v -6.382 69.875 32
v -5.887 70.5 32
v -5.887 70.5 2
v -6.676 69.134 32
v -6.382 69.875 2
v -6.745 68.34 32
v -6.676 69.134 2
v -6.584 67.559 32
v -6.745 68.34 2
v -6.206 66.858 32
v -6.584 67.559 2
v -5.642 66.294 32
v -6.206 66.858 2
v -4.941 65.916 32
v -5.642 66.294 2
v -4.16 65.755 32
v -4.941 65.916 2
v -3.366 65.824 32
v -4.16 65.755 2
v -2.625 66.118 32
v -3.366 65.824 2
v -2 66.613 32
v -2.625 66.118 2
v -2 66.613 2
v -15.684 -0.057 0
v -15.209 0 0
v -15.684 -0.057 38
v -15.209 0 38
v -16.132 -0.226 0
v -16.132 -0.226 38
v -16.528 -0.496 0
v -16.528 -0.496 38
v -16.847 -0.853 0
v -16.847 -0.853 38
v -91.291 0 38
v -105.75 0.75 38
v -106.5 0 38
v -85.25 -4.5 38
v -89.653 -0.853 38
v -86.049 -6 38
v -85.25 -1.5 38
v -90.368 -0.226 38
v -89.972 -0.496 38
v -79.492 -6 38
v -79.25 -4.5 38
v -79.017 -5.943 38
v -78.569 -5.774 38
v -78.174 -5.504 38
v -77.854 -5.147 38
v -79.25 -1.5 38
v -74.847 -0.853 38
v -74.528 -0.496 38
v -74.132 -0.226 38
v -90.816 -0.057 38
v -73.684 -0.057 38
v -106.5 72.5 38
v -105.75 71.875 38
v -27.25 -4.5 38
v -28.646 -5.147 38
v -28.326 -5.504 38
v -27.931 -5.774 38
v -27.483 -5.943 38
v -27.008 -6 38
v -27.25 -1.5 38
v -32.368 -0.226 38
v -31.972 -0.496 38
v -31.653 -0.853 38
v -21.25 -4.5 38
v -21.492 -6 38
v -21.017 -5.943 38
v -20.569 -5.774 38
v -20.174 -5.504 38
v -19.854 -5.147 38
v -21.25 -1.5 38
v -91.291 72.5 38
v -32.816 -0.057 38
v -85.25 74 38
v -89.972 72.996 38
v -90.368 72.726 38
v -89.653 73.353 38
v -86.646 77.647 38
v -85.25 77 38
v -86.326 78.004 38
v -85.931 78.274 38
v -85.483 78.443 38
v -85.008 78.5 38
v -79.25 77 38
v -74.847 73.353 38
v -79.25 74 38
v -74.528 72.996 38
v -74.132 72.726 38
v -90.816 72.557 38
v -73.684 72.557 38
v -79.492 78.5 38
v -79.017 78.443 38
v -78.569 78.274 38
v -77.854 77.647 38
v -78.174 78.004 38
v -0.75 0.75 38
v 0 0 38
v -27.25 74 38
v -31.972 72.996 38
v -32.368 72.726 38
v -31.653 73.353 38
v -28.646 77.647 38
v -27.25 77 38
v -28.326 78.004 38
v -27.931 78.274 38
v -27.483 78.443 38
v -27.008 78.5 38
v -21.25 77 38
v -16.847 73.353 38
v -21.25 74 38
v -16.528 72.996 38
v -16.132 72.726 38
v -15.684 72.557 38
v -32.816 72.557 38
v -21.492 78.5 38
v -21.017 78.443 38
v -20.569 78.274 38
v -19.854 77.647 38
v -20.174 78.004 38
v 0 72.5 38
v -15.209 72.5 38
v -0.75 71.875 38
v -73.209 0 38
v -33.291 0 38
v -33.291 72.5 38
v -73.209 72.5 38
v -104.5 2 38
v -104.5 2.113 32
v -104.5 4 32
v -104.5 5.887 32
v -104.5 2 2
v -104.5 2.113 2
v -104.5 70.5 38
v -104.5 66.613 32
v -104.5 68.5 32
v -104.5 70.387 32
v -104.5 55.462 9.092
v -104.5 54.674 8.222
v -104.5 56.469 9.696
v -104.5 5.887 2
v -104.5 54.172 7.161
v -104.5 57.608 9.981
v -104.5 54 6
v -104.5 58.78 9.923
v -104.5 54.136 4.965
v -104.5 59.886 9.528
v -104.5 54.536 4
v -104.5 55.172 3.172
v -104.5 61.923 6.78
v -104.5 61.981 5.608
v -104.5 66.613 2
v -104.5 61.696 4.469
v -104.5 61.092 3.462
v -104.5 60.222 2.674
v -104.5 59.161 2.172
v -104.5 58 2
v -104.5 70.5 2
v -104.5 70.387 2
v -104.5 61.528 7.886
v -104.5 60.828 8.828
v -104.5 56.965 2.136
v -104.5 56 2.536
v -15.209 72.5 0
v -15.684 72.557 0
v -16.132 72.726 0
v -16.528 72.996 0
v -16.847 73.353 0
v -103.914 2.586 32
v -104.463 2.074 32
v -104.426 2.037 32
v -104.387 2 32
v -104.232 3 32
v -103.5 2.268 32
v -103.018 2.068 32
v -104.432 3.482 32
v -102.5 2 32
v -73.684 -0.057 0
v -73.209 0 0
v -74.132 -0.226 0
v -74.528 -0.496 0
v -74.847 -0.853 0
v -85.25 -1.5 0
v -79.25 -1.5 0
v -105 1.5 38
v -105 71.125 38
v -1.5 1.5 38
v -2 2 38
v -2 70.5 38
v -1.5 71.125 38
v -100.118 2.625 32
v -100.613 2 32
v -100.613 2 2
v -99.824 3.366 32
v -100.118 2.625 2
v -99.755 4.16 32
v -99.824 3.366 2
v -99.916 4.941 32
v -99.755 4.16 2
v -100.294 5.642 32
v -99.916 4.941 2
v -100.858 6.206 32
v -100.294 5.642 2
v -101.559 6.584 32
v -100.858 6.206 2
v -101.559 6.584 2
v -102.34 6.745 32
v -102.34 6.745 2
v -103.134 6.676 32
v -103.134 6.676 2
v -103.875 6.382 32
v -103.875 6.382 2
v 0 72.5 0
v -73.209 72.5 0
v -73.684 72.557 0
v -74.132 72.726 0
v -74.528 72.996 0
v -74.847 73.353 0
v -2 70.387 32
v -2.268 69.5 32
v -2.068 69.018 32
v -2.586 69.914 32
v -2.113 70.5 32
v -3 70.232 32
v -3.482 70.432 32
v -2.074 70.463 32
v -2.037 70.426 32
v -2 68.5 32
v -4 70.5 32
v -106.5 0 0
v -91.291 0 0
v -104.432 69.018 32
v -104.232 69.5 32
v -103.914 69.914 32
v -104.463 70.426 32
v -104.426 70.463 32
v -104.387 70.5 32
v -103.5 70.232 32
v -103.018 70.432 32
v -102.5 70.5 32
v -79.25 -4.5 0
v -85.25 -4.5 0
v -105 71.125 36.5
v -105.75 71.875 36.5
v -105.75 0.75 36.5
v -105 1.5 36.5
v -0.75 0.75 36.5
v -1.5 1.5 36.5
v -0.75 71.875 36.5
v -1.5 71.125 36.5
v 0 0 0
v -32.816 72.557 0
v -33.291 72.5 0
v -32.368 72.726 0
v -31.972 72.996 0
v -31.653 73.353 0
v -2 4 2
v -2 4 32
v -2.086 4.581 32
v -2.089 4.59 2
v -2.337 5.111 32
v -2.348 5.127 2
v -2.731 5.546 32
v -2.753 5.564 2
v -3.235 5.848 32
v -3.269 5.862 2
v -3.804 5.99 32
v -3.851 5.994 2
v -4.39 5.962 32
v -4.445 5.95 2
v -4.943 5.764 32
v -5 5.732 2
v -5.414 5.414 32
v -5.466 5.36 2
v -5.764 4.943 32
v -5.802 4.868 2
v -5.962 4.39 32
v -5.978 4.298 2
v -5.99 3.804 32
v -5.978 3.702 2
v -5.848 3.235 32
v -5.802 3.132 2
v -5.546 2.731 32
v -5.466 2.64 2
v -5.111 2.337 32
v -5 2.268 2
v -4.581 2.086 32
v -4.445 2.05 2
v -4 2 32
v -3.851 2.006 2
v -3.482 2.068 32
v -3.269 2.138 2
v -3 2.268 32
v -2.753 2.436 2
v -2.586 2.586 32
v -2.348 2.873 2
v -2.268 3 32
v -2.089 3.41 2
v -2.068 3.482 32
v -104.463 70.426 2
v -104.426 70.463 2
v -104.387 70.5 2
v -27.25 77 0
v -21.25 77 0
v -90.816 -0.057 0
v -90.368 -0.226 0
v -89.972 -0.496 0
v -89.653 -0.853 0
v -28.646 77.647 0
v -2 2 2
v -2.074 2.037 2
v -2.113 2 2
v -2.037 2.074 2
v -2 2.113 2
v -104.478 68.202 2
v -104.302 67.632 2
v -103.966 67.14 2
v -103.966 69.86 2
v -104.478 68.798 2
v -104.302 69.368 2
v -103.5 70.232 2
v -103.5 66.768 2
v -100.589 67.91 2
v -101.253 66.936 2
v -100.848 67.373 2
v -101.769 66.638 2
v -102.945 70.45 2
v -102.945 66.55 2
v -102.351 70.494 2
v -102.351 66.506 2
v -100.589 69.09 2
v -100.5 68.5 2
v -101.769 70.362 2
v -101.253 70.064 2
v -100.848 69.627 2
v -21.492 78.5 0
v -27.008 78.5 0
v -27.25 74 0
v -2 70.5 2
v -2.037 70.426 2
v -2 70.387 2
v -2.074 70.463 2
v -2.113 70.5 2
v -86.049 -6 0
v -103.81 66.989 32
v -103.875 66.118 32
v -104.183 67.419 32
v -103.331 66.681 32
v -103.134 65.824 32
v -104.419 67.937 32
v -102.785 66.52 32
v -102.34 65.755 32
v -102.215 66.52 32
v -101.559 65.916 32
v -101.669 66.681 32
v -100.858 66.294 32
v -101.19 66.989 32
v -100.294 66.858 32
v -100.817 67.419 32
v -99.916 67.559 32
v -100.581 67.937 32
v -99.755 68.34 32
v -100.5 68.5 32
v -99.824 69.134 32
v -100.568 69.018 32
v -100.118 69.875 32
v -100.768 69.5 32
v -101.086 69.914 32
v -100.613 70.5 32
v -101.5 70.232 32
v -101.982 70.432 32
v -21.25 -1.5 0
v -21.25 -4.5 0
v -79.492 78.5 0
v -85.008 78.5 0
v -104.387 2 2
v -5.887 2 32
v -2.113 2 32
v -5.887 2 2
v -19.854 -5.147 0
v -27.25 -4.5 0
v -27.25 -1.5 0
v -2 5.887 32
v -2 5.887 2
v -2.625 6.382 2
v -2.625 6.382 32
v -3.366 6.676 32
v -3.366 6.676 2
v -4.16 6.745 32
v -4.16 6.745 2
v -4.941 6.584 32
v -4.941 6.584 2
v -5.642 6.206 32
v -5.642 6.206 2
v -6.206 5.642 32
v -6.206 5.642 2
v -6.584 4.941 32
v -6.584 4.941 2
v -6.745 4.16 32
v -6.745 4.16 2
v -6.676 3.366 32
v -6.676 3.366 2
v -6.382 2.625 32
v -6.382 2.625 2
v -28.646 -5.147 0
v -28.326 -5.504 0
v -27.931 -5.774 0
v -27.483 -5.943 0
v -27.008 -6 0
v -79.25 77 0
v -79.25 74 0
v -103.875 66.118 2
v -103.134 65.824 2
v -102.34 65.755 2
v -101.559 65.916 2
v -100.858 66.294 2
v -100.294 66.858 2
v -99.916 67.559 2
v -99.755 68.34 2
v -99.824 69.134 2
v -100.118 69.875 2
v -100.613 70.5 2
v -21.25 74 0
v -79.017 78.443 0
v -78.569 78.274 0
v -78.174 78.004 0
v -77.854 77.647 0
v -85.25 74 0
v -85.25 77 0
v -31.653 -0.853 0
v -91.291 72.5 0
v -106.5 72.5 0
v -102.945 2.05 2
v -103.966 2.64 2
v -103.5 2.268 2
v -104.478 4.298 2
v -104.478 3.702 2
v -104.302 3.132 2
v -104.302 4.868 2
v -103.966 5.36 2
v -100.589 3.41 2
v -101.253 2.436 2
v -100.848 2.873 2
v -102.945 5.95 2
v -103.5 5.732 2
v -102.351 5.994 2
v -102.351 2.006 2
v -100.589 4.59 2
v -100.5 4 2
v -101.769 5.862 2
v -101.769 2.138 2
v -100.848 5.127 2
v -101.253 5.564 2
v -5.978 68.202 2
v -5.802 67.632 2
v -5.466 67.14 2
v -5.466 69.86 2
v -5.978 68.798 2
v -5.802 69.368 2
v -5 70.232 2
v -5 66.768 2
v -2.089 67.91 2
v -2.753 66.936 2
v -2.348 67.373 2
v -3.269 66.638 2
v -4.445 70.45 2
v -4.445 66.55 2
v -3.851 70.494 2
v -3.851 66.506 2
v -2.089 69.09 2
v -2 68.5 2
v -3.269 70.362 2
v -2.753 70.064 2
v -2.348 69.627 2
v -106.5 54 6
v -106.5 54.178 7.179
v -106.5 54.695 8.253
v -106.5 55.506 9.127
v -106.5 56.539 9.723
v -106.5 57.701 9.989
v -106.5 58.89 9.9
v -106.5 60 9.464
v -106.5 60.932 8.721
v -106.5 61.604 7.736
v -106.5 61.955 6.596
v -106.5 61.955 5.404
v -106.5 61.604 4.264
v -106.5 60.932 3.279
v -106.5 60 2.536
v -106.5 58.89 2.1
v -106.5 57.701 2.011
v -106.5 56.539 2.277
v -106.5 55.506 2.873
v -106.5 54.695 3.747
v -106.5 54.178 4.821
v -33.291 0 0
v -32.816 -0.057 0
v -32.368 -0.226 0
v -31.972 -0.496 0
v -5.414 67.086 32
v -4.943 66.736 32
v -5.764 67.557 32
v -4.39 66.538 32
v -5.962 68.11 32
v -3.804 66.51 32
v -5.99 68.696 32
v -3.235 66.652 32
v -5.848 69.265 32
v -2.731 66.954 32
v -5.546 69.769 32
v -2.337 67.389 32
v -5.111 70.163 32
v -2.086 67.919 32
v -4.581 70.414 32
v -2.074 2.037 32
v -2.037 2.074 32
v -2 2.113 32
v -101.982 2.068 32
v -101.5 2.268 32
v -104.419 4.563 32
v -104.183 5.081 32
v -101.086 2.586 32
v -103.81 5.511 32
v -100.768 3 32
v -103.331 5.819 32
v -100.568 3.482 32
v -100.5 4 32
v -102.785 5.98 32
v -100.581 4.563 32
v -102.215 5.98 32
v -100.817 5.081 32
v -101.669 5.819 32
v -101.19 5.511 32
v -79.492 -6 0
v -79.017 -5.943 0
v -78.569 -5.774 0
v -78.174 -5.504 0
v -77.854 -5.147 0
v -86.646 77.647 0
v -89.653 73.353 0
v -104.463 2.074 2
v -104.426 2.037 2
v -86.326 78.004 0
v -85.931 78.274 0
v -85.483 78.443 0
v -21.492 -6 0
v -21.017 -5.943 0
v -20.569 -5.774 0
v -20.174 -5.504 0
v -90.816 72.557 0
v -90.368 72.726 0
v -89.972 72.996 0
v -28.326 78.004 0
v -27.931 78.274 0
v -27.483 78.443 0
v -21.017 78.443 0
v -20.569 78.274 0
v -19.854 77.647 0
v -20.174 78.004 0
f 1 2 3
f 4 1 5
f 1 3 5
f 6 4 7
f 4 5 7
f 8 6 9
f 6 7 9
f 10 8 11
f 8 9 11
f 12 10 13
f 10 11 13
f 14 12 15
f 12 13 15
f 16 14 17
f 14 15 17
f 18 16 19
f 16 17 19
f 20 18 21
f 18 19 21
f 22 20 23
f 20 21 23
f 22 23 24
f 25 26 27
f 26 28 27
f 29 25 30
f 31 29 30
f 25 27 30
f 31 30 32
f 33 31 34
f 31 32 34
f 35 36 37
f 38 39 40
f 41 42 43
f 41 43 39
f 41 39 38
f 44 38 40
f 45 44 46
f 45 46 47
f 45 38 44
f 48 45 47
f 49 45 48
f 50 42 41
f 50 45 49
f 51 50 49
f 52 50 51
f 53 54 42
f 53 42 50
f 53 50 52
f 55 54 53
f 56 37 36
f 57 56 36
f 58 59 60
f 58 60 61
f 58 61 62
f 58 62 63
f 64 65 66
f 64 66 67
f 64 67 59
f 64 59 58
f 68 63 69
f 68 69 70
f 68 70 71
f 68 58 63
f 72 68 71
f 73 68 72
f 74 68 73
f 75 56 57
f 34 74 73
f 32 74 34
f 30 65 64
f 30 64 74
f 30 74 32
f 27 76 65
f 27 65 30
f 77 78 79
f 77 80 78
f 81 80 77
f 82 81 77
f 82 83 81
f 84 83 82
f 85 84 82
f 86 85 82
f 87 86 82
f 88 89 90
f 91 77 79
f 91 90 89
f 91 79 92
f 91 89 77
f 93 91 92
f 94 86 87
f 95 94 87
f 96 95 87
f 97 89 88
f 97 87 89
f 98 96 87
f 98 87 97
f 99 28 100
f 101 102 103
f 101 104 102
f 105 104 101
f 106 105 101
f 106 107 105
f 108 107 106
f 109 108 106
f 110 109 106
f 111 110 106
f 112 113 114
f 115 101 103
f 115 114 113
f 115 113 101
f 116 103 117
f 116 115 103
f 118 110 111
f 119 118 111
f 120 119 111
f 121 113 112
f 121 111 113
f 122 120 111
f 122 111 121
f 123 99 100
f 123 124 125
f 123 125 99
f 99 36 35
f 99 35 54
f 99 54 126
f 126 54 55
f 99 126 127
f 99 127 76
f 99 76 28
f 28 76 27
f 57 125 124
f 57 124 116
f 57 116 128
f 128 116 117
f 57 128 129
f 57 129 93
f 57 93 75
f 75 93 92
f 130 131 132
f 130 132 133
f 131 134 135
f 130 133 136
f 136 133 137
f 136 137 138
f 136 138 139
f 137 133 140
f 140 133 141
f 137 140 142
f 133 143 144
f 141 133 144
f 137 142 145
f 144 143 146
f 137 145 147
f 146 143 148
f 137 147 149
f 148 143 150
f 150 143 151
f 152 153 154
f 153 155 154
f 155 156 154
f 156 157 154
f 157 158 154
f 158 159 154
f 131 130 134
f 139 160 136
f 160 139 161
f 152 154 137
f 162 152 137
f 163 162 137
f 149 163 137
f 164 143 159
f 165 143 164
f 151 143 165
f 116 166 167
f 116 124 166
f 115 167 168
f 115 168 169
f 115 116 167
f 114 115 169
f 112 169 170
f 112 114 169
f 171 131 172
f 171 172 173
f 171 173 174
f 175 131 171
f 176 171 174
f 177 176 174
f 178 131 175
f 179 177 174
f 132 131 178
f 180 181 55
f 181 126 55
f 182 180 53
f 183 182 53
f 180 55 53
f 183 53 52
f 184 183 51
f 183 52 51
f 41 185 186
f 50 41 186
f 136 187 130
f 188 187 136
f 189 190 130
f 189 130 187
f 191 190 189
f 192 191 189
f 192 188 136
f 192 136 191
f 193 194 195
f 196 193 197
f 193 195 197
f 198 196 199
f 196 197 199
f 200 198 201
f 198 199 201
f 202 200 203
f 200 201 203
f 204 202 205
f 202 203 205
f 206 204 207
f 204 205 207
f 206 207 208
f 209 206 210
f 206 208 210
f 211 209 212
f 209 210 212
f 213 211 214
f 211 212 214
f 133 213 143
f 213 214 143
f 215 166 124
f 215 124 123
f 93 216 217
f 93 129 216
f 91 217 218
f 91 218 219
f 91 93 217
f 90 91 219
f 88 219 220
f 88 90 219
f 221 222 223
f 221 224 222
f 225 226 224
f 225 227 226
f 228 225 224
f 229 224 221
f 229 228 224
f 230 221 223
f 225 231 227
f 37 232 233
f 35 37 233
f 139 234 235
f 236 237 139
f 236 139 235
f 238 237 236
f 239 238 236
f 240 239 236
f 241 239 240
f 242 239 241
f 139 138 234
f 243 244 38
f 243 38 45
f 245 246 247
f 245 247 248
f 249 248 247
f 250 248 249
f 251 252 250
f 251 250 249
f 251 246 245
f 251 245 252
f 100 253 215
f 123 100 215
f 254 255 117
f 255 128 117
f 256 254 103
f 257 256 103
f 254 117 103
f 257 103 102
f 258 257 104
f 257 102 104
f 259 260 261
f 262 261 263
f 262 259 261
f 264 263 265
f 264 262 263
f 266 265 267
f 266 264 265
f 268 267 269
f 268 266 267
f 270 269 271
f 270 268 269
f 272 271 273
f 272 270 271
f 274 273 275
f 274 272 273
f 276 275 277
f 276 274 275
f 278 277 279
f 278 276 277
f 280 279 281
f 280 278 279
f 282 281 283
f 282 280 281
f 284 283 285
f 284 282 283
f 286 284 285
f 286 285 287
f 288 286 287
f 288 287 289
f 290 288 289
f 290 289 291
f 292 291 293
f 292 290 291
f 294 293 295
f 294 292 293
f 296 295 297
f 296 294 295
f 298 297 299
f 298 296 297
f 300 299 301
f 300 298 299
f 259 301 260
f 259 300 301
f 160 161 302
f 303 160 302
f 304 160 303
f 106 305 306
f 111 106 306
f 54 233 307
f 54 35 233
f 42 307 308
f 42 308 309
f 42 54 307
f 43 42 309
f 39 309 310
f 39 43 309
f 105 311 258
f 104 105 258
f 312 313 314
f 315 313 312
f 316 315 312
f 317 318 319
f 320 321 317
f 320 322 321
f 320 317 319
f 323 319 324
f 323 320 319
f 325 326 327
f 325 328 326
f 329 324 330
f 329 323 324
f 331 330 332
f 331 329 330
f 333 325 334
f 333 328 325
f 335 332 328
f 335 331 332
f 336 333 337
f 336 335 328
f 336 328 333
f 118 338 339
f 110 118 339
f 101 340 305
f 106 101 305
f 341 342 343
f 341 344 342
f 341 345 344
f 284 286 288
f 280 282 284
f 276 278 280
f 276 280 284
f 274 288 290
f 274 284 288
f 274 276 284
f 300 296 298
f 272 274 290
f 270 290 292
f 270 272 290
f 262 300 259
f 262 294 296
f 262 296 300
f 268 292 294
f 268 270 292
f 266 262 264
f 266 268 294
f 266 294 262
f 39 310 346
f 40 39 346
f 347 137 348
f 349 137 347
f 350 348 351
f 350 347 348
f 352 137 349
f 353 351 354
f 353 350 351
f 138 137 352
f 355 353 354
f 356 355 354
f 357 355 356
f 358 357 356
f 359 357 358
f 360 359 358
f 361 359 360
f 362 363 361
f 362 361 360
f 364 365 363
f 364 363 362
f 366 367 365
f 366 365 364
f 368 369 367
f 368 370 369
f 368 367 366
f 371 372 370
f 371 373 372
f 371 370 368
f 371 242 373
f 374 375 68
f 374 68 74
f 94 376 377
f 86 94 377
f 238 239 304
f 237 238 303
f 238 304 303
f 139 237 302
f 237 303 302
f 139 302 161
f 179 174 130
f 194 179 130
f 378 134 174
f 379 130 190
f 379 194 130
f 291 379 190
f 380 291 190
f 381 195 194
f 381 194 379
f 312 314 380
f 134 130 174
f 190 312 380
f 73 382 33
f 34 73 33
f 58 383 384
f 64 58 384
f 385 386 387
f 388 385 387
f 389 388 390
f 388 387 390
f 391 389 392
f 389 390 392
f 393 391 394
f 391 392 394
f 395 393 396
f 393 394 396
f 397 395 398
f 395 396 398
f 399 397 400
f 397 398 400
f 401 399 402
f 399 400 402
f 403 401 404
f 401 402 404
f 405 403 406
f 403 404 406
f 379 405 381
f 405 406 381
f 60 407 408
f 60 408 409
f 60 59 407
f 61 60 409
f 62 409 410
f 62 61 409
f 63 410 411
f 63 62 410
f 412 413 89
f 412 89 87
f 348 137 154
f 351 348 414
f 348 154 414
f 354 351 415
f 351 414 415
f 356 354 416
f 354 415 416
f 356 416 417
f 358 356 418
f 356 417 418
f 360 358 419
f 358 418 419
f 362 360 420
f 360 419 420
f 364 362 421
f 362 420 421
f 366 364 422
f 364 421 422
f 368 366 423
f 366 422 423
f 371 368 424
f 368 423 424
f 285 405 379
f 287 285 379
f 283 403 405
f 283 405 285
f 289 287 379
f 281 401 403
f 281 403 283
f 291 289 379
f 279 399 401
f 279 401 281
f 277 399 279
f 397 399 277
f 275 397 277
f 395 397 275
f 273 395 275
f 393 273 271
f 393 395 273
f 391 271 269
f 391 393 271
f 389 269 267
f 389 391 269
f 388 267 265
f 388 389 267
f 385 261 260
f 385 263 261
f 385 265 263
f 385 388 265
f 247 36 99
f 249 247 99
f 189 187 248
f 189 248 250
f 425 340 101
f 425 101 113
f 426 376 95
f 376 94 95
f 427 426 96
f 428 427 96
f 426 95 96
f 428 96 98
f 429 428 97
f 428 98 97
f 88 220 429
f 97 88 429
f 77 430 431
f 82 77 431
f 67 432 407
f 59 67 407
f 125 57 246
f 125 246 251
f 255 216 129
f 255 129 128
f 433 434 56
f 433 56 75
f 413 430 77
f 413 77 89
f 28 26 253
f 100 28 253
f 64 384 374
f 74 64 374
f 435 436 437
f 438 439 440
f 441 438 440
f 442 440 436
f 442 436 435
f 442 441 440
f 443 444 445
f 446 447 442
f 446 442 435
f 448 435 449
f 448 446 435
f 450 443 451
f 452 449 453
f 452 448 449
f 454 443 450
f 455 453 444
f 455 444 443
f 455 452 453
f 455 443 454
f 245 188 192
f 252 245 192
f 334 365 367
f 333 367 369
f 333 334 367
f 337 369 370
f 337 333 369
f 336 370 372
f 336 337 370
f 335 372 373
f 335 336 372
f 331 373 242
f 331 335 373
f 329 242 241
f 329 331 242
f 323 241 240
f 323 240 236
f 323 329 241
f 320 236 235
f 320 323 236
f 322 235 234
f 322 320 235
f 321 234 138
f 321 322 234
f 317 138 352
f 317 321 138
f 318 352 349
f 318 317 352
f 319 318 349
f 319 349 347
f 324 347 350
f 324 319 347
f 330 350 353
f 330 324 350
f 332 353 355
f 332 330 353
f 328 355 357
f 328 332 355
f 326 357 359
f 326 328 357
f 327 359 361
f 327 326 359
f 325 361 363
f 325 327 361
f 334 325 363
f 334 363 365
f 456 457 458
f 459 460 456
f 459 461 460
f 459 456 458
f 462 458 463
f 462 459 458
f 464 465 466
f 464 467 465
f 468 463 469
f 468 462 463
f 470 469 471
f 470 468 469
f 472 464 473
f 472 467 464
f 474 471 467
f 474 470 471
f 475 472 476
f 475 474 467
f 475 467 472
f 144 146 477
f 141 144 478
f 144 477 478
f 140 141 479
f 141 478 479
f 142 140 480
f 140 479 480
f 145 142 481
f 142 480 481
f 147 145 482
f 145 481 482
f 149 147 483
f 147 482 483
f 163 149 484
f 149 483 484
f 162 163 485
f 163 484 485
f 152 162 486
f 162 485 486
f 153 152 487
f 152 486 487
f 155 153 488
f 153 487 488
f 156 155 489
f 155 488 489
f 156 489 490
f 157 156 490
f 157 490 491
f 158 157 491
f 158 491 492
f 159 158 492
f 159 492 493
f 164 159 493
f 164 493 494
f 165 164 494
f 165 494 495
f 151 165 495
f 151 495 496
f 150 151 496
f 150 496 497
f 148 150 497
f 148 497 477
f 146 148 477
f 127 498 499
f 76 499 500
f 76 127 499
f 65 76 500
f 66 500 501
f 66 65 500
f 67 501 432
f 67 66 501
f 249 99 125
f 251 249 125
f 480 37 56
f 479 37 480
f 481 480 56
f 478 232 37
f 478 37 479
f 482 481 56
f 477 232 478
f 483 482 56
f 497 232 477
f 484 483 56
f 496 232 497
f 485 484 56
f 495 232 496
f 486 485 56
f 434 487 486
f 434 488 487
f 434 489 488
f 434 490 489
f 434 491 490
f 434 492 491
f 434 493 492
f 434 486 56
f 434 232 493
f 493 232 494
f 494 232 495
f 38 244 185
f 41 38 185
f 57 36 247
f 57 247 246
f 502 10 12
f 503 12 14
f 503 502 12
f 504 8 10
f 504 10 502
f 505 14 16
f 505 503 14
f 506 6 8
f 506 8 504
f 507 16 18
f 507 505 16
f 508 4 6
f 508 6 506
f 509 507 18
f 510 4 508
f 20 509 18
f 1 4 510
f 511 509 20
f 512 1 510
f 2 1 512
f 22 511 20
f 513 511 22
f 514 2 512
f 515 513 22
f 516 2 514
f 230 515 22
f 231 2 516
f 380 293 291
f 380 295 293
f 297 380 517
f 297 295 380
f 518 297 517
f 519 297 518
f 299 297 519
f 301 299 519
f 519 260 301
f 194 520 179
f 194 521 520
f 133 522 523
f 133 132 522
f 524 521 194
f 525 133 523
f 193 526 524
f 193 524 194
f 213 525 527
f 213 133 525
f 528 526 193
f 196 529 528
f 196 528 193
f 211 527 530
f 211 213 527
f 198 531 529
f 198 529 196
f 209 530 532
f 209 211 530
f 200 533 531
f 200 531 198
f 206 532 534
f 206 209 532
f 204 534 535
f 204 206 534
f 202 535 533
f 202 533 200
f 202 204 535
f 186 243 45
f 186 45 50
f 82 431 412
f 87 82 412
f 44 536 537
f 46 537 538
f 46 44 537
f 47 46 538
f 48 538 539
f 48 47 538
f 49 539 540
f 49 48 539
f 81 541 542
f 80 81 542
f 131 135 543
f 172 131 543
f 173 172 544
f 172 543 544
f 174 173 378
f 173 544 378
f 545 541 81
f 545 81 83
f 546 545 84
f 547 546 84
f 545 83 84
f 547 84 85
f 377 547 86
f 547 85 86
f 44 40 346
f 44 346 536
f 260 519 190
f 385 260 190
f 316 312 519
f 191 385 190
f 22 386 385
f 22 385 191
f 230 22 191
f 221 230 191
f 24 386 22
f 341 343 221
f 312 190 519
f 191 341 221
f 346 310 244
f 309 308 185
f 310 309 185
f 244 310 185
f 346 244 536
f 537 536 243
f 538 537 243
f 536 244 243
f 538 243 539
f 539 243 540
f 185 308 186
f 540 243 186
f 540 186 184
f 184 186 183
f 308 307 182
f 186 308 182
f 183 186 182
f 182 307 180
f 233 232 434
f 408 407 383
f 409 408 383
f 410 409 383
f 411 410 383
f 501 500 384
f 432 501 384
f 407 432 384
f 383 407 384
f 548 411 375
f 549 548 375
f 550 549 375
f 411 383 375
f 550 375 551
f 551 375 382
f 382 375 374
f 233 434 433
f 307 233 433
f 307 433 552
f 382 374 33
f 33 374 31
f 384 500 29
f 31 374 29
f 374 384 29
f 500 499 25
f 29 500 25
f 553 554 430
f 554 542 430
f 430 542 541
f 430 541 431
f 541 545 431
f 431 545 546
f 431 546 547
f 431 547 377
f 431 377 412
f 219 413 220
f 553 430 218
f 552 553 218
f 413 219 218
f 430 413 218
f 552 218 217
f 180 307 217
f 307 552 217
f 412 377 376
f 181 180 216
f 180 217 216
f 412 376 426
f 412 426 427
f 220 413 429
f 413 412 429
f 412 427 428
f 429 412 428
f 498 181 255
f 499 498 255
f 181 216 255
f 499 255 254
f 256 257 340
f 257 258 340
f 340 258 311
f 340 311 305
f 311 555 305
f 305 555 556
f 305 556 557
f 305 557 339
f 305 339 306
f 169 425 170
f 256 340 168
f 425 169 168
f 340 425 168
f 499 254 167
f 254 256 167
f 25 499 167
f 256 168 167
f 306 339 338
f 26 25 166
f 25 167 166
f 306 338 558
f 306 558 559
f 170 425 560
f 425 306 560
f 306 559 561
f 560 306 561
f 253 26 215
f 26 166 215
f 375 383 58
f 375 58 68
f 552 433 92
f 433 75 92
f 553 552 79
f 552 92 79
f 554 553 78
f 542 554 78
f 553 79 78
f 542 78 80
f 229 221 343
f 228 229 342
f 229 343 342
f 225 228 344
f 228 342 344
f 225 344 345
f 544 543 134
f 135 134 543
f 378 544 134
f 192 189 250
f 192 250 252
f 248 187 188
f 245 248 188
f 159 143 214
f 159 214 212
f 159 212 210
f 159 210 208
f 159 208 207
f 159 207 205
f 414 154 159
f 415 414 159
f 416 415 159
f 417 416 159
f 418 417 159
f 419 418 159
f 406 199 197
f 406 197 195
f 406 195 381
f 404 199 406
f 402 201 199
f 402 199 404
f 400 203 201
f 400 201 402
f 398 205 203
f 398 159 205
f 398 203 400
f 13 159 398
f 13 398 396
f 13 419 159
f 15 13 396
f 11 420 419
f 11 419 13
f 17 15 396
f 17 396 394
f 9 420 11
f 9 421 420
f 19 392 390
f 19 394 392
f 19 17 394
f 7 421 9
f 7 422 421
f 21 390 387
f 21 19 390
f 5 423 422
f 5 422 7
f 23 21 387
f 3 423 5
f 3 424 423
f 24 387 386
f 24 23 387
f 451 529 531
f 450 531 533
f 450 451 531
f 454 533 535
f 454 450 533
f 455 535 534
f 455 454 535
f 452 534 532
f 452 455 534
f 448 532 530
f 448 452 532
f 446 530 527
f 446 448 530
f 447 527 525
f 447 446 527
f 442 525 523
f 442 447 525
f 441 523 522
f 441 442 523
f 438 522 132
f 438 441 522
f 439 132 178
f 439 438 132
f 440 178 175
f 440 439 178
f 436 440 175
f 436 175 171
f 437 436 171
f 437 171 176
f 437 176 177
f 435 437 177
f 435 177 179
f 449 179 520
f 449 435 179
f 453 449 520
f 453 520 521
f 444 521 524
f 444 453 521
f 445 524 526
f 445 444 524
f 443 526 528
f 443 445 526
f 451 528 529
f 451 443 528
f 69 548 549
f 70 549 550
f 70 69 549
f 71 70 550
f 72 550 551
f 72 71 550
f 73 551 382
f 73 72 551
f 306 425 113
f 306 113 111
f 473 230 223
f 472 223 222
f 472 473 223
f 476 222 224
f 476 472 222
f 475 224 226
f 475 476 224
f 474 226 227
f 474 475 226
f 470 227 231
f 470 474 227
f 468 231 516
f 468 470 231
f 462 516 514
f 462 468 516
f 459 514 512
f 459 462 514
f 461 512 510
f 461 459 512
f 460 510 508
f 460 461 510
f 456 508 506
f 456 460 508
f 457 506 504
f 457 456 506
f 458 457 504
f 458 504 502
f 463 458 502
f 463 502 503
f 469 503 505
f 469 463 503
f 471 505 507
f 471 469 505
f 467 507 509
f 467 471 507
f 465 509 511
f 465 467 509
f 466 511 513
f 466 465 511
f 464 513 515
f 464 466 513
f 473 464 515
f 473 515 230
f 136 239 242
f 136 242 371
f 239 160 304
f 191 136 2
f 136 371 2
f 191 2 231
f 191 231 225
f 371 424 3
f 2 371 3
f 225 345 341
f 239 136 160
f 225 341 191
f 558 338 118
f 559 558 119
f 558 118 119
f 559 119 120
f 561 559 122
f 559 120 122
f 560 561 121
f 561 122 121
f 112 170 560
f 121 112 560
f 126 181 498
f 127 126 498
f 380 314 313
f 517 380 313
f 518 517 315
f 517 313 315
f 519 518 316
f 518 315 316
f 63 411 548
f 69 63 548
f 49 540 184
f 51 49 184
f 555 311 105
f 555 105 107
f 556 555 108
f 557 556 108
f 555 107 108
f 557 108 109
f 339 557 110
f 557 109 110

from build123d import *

# Parameters (mm, degrees)
F0_W      = 106.5
F0_H      = 72.5
F1_DEPTH  = 38
F2_T      = -2
F3_W      = 6
F3_H      = 3
F4_DEPTH  = 38
F5_R      = 2
F6_R      = 4
F7_DEPTH  = 2
F8_R      = 2.75
F8_R_2    = 2
F9_DEPTH  = 30
F10_W     = 105
F10_H     = 71.125
F10_W_2   = 103.5
F10_H_2   = 69.625
F11_DEPTH = 1.5


with BuildPart() as f1:
    # F0 (on Top) → F1 (new body)
    with BuildSketch(Plane.XY):
        with Locations((-53.25, 36.25)):
            Rectangle(F0_W, F0_H)
    extrude(amount=F1_DEPTH)

    # F2
    f2_openings = [f1.faces().sort_by_distance(p)[0] for p in [
        (-53.25, 36.25, 38),
    ]]
    offset(amount=F2_T, openings=f2_openings)

    # F3 (on Top) → F4 (join)
    with BuildSketch(Plane.XY):
        Polygon((-28.048755, 78.5), (-32.25, 72.5), (-16.25, 72.5), (-20.451245, 78.5), align=None)
        with Locations((-24.25, 75.5)):
            Rectangle(F3_W, F3_H, mode=Mode.SUBTRACT)
        Polygon((-74.25, 72.5), (-78.451245, 78.5), (-86.048755, 78.5), (-90.25, 72.5), align=None)
        with Locations((-82.25, 75.5)):
            Rectangle(F3_W, F3_H, mode=Mode.SUBTRACT)
        Polygon((-74.25, 0), (-90.25, 0), (-86.048755, -6), (-78.451245, -6), align=None)
        with Locations((-82.25, -3)):
            Rectangle(F3_W, F3_H, mode=Mode.SUBTRACT)
        Polygon((-32.25, 0), (-28.048755, -6), (-20.451245, -6), (-16.25, 0), align=None)
        with Locations((-24.25, -3)):
            Rectangle(F3_W, F3_H, mode=Mode.SUBTRACT)
    extrude(amount=F4_DEPTH)

    # F5
    f5_edges = [f1.edges().sort_by_distance(p)[0] for p in [
        (-86.048755, 78.5, 19),
        (-78.451245, 78.5, 19),
        (-74.25, 72.5, 19),
        (-90.25, 72.5, 19),
        (-32.25, 72.5, 19),
        (-28.048755, 78.5, 19),
        (-20.451245, 78.5, 19),
        (-16.25, 72.5, 19),
        (-74.25, 0, 19),
        (-78.451245, -6, 19),
        (-90.25, 0, 19),
        (-32.25, 0, 19),
        (-28.048755, -6, 19),
        (-20.451245, -6, 19),
        (-16.25, 0, 19),
    ]]
    fillet(f5_edges, radius=F5_R)

    # F6 (on face) → F7 (cut, through all)
    with BuildSketch(Plane(origin=(-106.5, 0, 0), x_dir=(0, -1, 0), z_dir=(-1, 0, 0))):
        with Locations((-58, 6)):
            Circle(F6_R)
    extrude(amount=-F7_DEPTH, mode=Mode.SUBTRACT)

    # F8 (on face) → F9 (join)
    with BuildSketch(Plane.XY.offset(2)):
        with Locations((-102.5, 68.5)):
            Circle(F8_R)
        with Locations((-102.5, 68.5)):
            Circle(F8_R_2, mode=Mode.SUBTRACT)
        with Locations((-4, 68.5)):
            Circle(F8_R)
        with Locations((-4, 68.5)):
            Circle(F8_R_2, mode=Mode.SUBTRACT)
        with Locations((-4, 4)):
            Circle(F8_R)
        with Locations((-4, 4)):
            Circle(F8_R_2, mode=Mode.SUBTRACT)
        with Locations((-102.5, 4)):
            Circle(F8_R)
        with Locations((-102.5, 4)):
            Circle(F8_R_2, mode=Mode.SUBTRACT)
    extrude(amount=F9_DEPTH)

    # F10 (on face) → F11 (cut)
    with BuildSketch(Plane.XY.offset(38)):
        with Locations((-53.25, 36.3125)):
            Rectangle(F10_W, F10_H)
        with Locations((-53.25, 36.3125)):
            Rectangle(F10_W_2, F10_H_2, mode=Mode.SUBTRACT)
    extrude(amount=-F11_DEPTH, mode=Mode.SUBTRACT)


solid = f1.part
